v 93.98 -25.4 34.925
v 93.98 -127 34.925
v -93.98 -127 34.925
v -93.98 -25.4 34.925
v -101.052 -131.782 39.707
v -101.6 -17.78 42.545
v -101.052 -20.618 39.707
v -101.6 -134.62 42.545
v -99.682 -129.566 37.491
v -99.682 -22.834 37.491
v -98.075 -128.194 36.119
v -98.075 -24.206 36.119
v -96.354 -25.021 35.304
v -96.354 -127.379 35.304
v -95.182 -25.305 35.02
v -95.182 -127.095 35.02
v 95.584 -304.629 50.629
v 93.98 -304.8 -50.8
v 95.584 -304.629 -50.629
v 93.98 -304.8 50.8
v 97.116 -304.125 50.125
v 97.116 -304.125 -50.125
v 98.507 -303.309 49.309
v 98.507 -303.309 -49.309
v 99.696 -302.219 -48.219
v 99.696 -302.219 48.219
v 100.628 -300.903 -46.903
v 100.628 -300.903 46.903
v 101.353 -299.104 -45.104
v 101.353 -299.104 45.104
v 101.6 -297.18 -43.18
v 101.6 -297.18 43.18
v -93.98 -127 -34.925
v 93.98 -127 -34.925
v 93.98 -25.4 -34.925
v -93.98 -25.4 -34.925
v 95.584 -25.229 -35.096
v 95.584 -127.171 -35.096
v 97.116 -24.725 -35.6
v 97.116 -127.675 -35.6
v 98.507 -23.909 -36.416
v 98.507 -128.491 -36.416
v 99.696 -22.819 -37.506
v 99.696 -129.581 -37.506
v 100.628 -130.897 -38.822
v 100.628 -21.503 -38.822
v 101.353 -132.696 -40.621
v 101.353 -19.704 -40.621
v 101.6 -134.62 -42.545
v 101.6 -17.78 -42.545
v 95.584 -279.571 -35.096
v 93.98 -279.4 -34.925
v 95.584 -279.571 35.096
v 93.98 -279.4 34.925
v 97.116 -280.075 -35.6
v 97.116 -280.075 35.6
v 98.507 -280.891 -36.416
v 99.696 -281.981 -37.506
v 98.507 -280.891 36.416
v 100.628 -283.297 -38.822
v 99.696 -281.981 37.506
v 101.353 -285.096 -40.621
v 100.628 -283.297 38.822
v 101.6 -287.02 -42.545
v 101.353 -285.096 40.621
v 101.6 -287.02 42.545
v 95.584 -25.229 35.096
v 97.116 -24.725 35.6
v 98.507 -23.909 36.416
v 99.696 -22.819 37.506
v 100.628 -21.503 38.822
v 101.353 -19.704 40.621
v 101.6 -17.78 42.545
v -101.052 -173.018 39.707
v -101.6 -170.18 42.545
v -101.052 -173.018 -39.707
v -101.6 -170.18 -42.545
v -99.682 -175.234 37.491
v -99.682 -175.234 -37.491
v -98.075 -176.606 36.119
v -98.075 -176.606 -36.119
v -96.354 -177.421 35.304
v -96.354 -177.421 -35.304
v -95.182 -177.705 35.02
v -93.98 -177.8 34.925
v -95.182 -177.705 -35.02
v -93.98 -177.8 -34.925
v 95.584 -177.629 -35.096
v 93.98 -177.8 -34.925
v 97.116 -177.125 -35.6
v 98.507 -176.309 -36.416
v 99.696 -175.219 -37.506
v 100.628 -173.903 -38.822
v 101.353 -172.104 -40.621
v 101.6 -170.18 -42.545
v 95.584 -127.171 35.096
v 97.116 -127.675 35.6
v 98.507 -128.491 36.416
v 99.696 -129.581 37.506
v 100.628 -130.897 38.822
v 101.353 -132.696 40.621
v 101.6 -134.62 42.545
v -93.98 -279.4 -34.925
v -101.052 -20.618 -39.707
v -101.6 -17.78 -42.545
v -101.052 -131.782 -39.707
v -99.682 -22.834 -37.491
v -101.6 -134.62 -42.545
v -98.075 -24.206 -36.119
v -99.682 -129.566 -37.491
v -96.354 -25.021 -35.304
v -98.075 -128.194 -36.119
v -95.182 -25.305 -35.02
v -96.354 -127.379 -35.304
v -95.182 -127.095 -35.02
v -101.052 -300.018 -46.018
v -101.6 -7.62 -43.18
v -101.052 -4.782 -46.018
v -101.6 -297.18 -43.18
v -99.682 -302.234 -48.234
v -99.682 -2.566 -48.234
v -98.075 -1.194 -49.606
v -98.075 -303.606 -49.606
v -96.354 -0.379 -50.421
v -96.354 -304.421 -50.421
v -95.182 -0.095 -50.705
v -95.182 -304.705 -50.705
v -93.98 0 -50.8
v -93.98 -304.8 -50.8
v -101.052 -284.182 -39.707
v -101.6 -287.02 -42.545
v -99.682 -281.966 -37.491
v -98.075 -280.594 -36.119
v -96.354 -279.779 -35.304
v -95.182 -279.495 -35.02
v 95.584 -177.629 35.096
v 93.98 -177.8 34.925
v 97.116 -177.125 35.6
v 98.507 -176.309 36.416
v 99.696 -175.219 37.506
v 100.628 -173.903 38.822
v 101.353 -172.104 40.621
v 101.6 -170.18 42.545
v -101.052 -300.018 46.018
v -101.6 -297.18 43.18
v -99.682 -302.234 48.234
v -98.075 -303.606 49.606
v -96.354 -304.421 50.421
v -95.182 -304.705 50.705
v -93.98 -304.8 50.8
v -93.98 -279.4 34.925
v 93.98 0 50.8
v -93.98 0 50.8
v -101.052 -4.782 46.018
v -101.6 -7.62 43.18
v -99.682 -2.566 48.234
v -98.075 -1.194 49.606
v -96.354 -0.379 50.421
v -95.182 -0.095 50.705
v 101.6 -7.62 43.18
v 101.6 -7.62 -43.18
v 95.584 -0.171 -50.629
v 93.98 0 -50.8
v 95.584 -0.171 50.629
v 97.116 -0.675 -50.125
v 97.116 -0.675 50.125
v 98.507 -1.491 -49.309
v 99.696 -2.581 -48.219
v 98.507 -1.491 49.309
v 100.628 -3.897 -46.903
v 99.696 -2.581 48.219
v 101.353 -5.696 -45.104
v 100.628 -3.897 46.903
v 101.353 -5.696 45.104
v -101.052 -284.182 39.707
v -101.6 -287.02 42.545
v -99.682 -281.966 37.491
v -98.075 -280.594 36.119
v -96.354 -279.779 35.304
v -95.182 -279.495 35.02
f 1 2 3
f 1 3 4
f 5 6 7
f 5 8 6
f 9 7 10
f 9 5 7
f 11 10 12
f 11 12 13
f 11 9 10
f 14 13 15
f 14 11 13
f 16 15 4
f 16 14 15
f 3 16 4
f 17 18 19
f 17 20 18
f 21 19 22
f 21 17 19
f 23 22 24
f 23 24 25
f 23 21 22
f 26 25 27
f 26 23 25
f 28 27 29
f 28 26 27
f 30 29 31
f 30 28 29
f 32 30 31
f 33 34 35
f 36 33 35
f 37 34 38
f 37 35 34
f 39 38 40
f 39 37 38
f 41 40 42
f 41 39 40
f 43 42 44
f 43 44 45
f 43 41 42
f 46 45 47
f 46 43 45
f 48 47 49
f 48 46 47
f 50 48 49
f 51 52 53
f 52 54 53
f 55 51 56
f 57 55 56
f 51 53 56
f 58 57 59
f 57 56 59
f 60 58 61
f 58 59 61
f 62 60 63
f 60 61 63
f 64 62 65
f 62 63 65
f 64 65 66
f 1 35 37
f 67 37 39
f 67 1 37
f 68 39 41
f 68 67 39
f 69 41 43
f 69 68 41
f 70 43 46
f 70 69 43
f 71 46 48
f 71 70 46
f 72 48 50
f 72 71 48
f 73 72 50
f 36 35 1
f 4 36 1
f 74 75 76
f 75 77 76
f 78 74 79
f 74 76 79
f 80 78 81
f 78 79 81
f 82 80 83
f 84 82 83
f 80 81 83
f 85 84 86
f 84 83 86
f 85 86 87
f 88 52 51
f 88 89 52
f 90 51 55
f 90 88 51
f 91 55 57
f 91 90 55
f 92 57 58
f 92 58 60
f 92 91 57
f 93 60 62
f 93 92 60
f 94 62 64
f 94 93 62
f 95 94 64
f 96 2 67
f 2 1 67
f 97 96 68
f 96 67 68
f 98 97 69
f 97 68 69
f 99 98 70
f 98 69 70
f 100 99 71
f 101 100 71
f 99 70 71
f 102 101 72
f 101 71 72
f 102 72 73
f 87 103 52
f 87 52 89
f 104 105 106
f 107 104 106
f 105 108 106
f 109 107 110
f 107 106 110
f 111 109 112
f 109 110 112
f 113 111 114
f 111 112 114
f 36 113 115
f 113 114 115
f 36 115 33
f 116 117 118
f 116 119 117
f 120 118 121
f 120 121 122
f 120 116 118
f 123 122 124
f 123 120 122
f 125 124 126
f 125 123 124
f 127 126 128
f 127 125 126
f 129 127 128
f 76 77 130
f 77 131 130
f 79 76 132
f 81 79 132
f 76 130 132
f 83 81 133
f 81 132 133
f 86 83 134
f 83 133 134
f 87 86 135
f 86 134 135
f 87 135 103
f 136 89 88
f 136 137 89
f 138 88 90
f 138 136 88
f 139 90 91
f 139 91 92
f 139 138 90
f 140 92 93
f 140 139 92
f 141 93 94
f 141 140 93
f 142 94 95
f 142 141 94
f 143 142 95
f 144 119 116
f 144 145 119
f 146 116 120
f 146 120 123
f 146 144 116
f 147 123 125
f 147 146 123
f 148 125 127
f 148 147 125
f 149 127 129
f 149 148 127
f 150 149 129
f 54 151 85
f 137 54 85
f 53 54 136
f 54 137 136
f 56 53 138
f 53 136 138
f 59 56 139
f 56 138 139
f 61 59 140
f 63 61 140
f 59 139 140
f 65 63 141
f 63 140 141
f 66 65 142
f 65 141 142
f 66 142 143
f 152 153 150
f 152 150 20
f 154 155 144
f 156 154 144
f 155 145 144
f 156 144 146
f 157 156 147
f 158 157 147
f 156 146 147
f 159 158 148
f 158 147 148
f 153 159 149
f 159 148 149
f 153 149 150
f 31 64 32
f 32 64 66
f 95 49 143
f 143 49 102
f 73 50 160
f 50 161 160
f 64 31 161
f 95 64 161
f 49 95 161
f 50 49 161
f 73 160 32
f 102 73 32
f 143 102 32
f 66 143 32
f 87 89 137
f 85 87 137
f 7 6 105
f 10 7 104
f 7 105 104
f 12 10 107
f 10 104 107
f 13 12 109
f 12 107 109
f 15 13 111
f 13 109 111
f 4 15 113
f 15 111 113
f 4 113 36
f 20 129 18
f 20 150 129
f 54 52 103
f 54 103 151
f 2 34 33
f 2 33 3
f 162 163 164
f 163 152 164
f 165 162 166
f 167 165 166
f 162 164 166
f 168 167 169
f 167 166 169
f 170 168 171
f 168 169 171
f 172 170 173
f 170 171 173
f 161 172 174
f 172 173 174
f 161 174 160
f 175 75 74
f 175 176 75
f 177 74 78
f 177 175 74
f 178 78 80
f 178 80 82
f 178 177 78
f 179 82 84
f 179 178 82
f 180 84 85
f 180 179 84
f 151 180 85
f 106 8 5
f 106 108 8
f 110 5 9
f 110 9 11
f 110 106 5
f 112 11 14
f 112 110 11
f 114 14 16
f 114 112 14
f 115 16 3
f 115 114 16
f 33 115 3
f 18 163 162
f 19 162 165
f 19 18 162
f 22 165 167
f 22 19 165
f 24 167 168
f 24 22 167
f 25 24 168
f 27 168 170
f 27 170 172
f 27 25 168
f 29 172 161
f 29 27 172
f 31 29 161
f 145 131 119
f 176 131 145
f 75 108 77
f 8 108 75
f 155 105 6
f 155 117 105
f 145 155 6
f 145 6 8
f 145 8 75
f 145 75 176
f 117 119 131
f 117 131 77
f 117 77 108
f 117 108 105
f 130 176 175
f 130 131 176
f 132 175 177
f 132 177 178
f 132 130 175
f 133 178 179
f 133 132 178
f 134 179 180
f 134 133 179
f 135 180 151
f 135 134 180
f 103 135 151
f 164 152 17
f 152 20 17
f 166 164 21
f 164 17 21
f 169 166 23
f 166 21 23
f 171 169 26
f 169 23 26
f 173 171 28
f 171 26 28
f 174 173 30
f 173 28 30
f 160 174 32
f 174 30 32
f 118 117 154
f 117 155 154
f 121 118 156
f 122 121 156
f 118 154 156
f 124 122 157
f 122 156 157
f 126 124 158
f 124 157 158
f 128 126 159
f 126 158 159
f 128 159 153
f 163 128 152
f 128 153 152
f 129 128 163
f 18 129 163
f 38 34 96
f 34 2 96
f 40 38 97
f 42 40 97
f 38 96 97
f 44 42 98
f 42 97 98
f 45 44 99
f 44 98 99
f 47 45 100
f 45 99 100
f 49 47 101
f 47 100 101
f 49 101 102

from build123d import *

# Parameters (mm, degrees)
F0_W     = 203.2
F0_H     = 101.6
F1_DEPTH = 304.8
F2_W     = 101.6
F2_H     = 69.85
F3_DEPTH = 203.201
F4_R     = 7.62


with BuildPart() as f1:
    # F0 (on Front) → F1 (new body)
    with BuildSketch(Plane.XZ):
        Rectangle(F0_W, F0_H)
    extrude(amount=F1_DEPTH)

    # F2 (on face) → F3 (cut, through all)
    with BuildSketch(Plane.YZ.offset(101.6)):
        with Locations((-228.6, 0)):
            Rectangle(F2_W, F2_H)
        with Locations((-76.2, 0)):
            Rectangle(F2_W, F2_H)
    extrude(amount=-F3_DEPTH, mode=Mode.SUBTRACT)

    # F4
    f4_edges = [f1.edges().sort_by_distance(p)[0] for p in [
        (-101.6, -152.4, 50.8),
        (-101.6, 0, 0),
        (-101.6, -304.8, 0),
        (-101.6, -152.4, -50.8),
        (-101.6, -177.8, 0),
        (-101.6, -228.6, 34.925),
        (-101.6, -279.4, 0),
        (-101.6, -228.6, -34.925),
        (-101.6, -25.4, 0),
        (-101.6, -76.2, 34.925),
        (-101.6, -127, 0),
        (-101.6, -76.2, -34.925),
        (101.6, -152.4, -50.8),
        (101.6, 0, 0),
        (101.6, -304.8, 0),
        (101.6, -152.4, 50.8),
        (101.6, -228.6, -34.925),
        (101.6, -279.4, 0),
        (101.6, -228.6, 34.925),
        (101.6, -177.8, 0),
        (101.6, -76.2, -34.925),
        (101.6, -127, 0),
        (101.6, -76.2, 34.925),
        (101.6, -25.4, 0),
    ]]
    fillet(f4_edges, radius=F4_R)


solid = f1.part
